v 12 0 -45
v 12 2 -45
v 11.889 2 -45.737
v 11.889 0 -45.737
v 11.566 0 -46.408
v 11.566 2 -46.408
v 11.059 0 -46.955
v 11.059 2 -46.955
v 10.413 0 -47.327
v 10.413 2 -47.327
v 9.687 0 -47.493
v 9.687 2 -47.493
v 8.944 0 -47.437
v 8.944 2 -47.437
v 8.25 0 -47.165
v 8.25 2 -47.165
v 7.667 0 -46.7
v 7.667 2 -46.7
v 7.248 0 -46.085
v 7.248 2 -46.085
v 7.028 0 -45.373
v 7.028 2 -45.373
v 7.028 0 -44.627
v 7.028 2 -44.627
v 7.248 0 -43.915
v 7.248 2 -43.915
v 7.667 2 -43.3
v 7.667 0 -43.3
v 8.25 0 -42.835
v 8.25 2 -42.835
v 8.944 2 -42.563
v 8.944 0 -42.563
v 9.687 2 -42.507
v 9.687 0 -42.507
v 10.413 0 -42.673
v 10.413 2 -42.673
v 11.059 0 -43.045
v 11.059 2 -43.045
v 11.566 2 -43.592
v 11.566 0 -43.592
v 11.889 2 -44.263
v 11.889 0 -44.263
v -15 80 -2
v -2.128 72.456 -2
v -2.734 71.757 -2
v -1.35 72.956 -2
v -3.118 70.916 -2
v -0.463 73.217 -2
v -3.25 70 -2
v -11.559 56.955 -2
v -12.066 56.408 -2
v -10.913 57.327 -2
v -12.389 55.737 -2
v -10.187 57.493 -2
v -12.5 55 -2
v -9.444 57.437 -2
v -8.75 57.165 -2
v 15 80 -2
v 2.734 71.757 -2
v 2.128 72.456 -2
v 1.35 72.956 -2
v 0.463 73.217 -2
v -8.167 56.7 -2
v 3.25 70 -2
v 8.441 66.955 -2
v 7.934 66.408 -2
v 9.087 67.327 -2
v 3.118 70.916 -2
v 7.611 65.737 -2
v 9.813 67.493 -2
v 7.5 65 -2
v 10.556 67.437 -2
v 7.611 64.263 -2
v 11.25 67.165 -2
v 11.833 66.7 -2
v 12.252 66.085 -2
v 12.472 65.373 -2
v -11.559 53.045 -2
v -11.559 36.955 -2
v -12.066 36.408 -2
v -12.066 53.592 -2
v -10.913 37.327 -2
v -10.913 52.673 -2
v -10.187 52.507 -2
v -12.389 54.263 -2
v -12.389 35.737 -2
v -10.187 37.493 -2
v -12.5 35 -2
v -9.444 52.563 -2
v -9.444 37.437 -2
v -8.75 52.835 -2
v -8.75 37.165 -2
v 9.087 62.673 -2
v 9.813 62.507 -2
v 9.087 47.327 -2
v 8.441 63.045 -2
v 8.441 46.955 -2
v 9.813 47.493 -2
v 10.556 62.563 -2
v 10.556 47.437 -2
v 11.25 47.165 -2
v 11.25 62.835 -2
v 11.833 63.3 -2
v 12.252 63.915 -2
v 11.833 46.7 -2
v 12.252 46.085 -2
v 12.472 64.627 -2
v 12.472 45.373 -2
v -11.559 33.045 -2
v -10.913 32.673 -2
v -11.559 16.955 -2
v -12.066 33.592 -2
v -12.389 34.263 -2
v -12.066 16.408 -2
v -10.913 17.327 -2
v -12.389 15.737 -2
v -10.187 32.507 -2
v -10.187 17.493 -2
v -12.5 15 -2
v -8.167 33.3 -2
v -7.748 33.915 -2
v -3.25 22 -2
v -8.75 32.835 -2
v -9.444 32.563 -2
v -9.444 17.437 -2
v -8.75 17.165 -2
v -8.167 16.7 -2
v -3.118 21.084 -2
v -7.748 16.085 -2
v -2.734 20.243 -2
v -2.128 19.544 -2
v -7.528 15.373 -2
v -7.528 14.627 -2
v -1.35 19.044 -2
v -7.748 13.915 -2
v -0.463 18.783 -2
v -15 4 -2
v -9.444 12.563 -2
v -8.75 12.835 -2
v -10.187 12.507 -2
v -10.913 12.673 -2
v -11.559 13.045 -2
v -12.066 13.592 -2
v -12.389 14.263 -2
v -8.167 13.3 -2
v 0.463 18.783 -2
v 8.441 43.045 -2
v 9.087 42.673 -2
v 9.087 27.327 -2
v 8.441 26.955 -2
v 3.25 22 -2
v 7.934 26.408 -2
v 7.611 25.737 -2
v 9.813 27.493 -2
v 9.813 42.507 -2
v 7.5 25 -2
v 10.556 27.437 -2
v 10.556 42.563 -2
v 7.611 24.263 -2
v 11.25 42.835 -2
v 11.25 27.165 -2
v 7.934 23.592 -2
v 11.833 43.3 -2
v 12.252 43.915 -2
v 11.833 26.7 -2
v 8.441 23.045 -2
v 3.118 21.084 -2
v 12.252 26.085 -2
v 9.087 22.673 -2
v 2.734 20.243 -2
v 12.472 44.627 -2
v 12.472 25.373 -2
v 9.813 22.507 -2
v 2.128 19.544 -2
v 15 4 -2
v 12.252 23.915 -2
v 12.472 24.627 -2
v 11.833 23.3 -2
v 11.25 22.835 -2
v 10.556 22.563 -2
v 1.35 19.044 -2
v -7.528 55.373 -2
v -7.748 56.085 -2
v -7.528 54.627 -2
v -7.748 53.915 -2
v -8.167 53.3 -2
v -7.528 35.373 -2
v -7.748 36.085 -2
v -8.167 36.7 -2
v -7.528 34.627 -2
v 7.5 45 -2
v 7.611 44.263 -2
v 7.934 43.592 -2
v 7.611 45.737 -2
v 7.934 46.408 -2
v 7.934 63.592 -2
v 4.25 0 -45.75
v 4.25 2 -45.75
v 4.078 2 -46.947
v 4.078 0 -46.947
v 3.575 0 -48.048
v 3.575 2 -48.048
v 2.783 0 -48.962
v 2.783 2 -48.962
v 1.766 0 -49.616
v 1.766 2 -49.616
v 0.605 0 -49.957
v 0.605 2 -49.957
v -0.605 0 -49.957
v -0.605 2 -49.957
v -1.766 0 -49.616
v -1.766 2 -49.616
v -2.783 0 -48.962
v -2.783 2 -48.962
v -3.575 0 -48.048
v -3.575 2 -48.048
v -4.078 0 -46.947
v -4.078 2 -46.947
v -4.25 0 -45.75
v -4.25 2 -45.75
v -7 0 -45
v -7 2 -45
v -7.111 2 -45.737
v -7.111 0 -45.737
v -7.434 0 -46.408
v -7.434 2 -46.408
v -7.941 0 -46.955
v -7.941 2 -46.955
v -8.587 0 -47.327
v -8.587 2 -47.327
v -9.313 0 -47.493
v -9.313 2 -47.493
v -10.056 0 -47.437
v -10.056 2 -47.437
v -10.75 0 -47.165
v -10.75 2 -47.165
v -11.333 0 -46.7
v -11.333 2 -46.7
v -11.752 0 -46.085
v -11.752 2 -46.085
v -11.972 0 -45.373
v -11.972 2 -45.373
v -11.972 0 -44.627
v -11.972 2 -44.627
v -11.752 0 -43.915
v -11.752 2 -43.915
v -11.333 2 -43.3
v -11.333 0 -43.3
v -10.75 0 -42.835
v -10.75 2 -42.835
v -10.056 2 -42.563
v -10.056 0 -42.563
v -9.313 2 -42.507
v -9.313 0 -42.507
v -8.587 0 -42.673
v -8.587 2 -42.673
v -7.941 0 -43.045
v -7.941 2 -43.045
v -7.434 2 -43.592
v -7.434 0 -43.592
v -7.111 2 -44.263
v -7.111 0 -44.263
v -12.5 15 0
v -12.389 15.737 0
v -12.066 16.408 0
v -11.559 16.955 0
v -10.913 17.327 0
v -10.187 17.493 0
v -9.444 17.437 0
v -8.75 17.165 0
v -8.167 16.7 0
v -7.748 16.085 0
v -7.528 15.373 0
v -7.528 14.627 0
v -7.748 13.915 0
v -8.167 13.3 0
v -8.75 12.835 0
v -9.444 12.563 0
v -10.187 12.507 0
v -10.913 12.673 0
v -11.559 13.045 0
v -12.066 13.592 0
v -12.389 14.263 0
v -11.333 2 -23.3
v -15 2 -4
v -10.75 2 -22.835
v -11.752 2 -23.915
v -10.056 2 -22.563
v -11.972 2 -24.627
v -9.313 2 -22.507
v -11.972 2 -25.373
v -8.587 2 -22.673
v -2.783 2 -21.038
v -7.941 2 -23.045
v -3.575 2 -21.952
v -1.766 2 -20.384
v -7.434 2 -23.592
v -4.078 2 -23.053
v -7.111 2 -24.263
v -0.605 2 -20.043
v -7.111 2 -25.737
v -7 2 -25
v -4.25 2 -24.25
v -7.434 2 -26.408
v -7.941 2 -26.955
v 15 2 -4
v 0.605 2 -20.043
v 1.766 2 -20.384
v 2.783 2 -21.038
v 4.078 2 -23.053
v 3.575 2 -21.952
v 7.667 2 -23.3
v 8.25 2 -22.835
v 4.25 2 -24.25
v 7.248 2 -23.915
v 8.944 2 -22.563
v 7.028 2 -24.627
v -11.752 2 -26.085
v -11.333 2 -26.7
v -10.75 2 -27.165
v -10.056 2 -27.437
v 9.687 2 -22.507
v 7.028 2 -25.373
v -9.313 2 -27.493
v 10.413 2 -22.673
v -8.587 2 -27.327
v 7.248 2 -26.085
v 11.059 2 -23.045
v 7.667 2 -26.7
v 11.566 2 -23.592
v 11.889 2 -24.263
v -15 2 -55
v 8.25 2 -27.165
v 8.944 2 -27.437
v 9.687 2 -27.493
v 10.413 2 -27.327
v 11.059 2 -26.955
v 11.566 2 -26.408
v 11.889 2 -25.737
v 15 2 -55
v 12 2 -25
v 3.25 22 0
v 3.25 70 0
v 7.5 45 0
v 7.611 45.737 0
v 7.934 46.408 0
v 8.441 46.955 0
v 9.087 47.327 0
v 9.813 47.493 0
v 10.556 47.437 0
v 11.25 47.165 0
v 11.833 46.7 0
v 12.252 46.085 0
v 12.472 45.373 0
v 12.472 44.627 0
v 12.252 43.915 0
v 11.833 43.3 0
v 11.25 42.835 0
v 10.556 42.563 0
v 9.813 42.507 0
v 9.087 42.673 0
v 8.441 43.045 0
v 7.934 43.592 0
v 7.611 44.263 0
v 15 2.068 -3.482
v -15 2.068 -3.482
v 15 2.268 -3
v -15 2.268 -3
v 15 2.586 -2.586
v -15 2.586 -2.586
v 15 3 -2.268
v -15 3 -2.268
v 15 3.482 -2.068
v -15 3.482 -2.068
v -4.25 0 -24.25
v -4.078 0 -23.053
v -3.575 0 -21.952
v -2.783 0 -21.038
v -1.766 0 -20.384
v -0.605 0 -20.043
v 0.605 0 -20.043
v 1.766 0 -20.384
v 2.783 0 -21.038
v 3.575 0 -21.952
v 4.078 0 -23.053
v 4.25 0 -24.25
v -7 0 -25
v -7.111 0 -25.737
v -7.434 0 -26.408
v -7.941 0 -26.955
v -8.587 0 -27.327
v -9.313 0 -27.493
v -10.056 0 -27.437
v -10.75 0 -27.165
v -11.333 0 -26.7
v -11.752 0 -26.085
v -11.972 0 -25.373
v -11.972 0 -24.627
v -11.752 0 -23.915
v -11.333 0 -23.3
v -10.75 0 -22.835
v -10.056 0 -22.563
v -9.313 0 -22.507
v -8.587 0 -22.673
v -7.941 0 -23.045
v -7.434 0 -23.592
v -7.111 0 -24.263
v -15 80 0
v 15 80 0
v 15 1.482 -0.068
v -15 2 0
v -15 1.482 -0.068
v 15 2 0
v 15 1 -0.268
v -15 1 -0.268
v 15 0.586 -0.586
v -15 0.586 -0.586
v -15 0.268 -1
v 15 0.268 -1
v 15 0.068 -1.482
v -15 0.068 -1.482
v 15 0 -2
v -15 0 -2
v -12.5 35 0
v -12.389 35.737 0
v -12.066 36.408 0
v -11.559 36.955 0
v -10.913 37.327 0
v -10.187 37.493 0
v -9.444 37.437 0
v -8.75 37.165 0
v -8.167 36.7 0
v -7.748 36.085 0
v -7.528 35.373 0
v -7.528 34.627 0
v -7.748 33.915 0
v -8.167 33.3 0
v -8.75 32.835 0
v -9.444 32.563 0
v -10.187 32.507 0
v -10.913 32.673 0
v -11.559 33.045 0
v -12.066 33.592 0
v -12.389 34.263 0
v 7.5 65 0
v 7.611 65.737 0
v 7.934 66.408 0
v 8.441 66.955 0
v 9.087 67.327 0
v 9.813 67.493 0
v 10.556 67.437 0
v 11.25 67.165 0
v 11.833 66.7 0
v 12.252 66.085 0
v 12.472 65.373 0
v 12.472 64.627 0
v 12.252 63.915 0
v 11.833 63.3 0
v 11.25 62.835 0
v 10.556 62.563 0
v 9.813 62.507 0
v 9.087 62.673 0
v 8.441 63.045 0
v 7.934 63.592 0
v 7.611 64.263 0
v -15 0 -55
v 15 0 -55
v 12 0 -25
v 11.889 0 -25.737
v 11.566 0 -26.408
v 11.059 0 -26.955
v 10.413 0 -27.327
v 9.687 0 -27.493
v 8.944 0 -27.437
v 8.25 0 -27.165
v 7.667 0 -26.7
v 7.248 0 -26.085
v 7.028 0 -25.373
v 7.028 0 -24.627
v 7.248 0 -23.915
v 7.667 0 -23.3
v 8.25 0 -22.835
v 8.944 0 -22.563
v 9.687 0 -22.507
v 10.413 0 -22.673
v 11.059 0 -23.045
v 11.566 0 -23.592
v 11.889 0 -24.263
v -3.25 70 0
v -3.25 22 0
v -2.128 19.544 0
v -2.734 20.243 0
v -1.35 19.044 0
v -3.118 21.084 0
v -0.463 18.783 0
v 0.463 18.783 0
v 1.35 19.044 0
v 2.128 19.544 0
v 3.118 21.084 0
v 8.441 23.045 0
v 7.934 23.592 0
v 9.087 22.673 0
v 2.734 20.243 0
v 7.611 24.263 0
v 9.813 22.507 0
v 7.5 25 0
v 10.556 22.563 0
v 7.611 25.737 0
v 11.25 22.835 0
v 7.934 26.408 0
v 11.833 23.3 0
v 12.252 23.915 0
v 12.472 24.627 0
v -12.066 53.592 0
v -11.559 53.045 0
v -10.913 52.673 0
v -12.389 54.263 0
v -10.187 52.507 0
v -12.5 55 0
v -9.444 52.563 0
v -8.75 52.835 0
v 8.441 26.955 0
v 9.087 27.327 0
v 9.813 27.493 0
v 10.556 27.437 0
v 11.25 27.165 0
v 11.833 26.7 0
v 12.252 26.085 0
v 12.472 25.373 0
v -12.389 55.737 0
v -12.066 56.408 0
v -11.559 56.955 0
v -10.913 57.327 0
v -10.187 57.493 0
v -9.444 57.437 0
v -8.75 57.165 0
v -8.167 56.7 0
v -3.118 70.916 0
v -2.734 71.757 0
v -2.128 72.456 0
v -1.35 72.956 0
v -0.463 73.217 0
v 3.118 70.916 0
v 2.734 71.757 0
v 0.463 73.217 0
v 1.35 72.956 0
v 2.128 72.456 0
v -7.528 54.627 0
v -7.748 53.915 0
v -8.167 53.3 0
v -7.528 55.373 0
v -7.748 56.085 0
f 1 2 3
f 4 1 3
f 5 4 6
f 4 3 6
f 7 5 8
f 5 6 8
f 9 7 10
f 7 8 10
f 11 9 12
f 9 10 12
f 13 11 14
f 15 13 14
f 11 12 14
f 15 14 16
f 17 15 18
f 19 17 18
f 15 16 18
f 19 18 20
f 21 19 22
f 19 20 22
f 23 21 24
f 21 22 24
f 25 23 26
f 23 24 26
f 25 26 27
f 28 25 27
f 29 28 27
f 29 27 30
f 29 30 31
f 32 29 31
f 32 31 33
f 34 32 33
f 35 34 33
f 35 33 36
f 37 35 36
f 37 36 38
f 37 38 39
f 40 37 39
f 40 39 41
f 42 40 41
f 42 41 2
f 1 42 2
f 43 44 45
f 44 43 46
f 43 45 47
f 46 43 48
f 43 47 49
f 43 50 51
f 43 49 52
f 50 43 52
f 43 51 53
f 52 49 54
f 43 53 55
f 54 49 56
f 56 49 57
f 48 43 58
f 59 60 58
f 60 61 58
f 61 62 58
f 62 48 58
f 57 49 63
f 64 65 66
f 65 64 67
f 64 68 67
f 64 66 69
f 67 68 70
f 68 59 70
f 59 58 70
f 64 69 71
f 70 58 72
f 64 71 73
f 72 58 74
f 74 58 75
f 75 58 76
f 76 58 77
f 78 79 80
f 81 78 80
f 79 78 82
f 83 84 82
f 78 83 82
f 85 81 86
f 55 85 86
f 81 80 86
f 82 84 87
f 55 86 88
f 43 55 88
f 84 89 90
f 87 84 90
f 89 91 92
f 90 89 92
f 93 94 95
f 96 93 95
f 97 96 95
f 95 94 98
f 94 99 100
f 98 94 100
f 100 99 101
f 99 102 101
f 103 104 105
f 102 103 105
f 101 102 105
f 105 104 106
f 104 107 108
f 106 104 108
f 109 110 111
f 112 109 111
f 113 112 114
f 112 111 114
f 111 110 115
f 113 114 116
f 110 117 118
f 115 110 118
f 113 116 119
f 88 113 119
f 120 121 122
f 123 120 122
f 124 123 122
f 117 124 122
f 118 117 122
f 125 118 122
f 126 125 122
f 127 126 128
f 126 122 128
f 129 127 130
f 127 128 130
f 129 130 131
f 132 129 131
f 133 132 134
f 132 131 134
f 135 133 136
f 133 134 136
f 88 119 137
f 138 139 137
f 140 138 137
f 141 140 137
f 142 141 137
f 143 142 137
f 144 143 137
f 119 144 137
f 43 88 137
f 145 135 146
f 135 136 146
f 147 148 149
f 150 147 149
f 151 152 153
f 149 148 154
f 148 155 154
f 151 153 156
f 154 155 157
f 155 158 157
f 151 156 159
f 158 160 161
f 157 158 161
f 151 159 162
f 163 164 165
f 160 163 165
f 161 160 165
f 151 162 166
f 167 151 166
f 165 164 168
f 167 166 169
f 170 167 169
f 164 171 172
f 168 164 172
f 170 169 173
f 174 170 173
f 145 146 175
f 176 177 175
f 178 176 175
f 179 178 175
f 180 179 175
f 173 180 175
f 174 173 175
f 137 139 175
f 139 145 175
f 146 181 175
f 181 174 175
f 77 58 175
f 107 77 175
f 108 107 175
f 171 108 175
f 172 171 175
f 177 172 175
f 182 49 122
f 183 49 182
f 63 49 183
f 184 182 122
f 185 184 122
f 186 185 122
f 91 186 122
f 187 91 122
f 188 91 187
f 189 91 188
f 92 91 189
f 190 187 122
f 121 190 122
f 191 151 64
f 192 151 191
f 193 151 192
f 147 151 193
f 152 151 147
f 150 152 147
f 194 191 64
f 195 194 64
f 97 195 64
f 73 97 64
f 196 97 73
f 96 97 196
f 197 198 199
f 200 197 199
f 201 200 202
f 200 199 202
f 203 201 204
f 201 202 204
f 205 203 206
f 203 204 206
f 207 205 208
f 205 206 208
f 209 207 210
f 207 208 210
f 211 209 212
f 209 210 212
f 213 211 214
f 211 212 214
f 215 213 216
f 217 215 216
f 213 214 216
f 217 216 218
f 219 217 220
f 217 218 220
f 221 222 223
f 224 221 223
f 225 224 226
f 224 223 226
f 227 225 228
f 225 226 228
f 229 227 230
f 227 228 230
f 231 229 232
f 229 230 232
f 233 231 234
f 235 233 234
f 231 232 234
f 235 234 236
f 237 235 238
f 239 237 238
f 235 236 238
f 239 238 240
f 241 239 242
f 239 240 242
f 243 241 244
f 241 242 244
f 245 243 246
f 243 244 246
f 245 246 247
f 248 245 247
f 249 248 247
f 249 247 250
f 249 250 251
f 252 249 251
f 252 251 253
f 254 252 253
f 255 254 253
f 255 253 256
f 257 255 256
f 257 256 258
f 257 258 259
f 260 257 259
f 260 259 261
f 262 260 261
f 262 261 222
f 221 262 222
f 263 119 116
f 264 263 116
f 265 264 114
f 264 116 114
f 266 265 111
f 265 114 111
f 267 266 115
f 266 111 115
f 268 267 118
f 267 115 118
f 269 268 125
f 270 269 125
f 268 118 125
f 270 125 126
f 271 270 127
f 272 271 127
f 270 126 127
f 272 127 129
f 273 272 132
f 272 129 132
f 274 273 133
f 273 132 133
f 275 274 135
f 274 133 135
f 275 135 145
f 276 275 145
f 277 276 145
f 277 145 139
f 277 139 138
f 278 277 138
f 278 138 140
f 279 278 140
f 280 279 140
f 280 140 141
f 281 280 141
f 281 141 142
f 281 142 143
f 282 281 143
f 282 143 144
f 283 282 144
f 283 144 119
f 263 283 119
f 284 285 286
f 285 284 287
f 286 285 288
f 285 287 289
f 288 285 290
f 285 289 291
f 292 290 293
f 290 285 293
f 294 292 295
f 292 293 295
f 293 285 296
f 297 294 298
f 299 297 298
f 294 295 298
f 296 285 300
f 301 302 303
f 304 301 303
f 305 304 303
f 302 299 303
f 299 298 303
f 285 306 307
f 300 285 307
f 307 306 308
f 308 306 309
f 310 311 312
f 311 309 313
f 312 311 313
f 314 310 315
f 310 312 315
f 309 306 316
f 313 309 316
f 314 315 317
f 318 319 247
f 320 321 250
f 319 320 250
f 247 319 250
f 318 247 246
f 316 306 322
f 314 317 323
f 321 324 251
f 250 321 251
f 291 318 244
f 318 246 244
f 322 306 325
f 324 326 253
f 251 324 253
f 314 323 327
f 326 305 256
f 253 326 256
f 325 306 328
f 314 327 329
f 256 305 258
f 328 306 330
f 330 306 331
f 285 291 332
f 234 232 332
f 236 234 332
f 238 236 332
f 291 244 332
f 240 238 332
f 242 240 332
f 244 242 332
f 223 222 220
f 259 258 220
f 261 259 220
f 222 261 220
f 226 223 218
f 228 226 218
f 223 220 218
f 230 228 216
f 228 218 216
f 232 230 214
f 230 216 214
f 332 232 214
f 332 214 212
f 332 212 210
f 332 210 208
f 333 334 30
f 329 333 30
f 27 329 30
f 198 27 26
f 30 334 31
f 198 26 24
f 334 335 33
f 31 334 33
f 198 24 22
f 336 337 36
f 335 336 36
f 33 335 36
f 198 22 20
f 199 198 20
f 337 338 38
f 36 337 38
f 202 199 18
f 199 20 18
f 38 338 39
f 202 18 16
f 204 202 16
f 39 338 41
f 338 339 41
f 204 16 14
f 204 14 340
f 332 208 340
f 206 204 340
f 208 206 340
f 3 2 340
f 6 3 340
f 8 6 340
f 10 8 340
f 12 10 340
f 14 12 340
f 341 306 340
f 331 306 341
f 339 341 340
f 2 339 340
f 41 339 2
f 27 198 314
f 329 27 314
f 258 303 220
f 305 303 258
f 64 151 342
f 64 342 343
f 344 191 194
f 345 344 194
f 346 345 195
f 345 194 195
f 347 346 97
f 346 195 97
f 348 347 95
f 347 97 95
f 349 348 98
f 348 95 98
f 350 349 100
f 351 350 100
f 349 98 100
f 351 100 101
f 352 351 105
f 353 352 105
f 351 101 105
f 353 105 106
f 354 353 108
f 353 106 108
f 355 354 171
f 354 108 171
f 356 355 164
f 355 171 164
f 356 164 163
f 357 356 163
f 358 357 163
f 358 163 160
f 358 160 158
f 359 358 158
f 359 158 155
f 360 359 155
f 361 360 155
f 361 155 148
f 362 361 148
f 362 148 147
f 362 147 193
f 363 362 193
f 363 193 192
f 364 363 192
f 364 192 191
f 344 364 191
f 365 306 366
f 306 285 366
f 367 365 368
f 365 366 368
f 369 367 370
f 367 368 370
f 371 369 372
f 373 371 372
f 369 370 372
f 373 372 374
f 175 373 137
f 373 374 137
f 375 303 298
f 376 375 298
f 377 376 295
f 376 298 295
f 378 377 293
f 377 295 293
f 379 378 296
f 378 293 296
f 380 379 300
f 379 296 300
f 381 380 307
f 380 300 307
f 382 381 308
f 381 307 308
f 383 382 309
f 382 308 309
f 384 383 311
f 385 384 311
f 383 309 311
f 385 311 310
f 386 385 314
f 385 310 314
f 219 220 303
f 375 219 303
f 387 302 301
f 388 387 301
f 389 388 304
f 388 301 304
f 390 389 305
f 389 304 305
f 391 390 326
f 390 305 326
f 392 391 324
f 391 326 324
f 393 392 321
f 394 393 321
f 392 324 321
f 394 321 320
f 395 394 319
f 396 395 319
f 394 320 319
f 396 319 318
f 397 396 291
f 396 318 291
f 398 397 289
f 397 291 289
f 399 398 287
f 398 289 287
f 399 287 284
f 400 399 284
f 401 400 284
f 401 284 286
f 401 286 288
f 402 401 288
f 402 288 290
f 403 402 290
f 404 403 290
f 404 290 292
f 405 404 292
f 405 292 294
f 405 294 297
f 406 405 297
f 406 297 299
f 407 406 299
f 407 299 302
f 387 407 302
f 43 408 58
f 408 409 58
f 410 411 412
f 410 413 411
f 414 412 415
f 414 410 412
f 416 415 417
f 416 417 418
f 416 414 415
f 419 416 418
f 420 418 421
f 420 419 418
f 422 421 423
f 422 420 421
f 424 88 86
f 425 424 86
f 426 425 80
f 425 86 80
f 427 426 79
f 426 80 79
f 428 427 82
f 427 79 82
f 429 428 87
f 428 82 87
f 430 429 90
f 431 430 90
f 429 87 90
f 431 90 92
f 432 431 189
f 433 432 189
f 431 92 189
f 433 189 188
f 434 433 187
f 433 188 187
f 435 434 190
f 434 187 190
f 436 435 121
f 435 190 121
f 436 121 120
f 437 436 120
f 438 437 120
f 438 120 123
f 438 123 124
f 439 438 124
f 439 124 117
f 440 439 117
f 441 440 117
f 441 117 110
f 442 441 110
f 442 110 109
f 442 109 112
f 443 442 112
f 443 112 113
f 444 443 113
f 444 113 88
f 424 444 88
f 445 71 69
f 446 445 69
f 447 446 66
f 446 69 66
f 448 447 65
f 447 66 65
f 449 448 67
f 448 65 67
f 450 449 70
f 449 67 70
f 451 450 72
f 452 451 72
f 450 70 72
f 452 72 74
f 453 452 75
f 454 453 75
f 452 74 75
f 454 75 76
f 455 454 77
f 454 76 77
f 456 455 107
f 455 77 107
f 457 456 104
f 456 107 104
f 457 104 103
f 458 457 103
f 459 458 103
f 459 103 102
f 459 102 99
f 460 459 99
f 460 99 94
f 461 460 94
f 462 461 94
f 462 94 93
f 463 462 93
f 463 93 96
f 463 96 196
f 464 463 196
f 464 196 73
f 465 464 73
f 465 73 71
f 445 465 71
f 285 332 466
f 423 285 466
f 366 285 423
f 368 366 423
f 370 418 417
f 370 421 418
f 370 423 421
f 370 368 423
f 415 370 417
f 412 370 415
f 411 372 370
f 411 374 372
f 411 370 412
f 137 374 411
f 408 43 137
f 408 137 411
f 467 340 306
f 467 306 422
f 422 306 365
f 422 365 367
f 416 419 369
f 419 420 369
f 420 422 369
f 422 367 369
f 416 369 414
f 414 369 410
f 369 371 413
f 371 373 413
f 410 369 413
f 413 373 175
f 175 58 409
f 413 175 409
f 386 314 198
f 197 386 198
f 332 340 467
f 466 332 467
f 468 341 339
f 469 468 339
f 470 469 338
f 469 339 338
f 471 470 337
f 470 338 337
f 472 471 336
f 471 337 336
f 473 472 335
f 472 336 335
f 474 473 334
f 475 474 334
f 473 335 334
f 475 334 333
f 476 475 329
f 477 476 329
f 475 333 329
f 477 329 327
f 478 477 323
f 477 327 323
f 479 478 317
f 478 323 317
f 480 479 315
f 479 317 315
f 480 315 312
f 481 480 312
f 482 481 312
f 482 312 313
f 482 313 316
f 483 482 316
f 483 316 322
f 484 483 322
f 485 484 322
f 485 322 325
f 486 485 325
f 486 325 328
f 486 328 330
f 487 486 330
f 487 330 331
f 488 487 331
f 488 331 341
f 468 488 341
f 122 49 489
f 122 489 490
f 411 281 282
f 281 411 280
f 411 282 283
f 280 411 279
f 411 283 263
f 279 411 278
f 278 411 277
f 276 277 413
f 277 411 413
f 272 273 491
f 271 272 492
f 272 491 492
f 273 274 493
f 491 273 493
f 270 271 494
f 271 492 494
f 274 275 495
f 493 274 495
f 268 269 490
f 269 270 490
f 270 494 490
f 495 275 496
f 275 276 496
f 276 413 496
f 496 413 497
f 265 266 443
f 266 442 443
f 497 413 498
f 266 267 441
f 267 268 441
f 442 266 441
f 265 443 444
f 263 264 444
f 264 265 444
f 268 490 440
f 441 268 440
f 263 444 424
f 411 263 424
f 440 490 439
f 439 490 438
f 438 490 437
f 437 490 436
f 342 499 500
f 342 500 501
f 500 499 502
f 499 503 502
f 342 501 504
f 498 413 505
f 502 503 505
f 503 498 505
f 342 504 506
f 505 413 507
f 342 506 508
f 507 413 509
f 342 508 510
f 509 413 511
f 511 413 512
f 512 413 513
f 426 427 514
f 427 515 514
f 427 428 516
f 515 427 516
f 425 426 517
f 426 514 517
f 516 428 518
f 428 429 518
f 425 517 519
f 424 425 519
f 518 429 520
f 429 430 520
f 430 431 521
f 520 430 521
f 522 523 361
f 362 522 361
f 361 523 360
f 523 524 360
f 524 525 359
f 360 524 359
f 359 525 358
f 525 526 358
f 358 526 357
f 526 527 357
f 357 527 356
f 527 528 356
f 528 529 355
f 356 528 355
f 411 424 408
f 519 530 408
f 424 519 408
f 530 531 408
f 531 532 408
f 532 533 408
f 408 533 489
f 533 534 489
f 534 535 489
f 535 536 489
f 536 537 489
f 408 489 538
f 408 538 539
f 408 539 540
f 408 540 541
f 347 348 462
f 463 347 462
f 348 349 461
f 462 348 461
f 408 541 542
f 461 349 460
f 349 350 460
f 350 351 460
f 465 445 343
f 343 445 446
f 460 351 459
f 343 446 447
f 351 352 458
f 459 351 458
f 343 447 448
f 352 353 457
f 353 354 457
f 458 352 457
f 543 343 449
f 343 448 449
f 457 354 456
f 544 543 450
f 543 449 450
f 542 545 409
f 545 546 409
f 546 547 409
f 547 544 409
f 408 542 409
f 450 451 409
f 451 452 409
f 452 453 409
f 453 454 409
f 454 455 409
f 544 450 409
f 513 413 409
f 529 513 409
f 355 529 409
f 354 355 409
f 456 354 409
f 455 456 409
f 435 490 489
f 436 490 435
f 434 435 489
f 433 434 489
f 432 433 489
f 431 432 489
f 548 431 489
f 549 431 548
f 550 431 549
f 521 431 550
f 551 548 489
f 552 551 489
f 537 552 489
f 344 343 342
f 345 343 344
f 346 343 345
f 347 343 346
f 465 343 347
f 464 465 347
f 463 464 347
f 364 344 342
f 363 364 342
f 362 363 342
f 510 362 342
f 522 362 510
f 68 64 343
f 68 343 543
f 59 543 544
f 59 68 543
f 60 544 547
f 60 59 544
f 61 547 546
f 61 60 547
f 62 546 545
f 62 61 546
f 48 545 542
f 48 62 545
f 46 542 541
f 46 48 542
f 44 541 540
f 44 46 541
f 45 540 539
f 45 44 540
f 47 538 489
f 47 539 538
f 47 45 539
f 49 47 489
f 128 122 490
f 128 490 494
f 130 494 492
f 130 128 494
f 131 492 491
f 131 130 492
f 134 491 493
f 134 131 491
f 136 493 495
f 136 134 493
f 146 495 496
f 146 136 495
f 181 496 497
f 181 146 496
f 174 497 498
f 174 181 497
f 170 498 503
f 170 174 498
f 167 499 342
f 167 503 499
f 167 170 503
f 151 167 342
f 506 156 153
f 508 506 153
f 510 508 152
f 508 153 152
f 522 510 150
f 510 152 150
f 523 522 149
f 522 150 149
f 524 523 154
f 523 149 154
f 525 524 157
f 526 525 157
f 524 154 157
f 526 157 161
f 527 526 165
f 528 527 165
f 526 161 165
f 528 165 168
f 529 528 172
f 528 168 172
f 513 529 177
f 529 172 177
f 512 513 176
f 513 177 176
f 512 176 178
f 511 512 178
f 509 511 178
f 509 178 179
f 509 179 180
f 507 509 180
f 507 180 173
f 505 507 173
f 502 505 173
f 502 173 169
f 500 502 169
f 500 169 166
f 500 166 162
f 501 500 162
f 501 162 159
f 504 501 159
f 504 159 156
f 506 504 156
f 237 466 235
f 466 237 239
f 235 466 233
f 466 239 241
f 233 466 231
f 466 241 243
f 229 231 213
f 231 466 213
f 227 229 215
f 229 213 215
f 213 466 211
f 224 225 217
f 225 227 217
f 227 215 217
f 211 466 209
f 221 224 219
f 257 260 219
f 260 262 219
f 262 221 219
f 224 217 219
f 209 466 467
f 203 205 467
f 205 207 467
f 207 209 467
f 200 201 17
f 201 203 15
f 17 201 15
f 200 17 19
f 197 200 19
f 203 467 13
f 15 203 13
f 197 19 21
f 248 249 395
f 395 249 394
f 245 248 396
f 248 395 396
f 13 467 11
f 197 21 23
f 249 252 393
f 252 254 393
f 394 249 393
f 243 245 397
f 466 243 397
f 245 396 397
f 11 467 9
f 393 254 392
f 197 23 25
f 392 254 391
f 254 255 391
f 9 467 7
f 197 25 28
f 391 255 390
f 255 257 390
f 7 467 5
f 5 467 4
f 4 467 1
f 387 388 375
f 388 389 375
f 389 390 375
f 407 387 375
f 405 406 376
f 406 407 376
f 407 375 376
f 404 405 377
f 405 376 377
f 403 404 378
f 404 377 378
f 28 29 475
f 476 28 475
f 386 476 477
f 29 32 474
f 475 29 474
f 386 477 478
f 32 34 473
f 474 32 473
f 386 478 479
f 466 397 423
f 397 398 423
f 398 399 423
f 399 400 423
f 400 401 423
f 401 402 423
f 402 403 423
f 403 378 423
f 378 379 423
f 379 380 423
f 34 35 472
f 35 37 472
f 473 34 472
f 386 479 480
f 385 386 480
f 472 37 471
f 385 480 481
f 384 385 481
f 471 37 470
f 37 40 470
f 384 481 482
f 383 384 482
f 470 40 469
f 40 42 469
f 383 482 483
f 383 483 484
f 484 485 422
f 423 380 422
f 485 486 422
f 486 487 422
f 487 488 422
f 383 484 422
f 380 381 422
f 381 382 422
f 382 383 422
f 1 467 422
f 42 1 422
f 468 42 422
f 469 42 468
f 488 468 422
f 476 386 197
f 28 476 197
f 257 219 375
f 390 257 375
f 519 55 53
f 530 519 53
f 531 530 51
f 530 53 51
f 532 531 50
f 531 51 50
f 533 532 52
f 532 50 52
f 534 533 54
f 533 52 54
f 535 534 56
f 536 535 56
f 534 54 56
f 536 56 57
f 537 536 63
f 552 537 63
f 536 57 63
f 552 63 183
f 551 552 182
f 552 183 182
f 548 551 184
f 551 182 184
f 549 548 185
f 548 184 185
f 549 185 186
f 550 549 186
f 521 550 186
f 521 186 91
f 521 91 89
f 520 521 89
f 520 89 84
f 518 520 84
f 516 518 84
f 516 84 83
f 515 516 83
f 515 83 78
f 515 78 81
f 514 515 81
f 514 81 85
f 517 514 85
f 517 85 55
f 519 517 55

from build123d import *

# Parameters (mm, degrees)
BOSS_EXTRU_1_DEPTH      = 15
CONG_1_R                = 2
ENL_V_MAT_EXTRU_1_REACH = 4
ESQUISSE2_R             = 2.5
ENL_V_MAT_EXTRU_2_REACH = 4
ESQUISSE4_R             = 2.5


with BuildPart() as part:
    # Esquisse1 → Boss.-Extru.1 (new body, symmetric)
    with BuildSketch(Plane(origin=(0, 0, 0), x_dir=(0, 0, -1), z_dir=(1, 0, 0))):
        Polygon((0, 0), (0, 80), (2, 80), (2, 2), (55, 2), (55, 0), align=None)
    extrude(amount=BOSS_EXTRU_1_DEPTH, both=True)

    # Congé1
    cong_1_edges = [part.edges().sort_by_distance(p)[0] for p in [
        (0, 0, 0),
        (0, 2, -2),
    ]]
    fillet(cong_1_edges, radius=CONG_1_R)

    # Esquisse2 → Enlèv. mat.-Extru.1 (cut, up to next)
    with BuildSketch(Plane(origin=(0, 2, 0), x_dir=(1, 0, 0), z_dir=(0, 1, 0)), mode=Mode.PRIVATE) as enl_v_mat_extru_1_sk1:
        with BuildLine():
            Line((4.25, 24.25), (4.25, 45.75))
            ThreePointArc((4.25, 45.75), (0, 50), (-4.25, 45.75))
            Line((-4.25, 45.75), (-4.25, 24.25))
            ThreePointArc((-4.25, 24.25), (0, 20), (4.25, 24.25))
        make_face()
    enl_v_mat_extru_1_tool1 = extrude(enl_v_mat_extru_1_sk1.sketch, amount=-ENL_V_MAT_EXTRU_1_REACH, mode=Mode.PRIVATE) & part.part
    add(enl_v_mat_extru_1_tool1.solids().sort_by_distance((0, 2, -35))[0], mode=Mode.SUBTRACT)
    # Esquisse2 → Enlèv. mat.-Extru.1 (cut, up to next)
    with BuildSketch(Plane(origin=(0, 2, 0), x_dir=(1, 0, 0), z_dir=(0, 1, 0)), mode=Mode.PRIVATE) as enl_v_mat_extru_1_sk2:
        with Locations((-9.5, 25)):
            Circle(ESQUISSE2_R)
    enl_v_mat_extru_1_tool2 = extrude(enl_v_mat_extru_1_sk2.sketch, amount=-ENL_V_MAT_EXTRU_1_REACH, mode=Mode.PRIVATE) & part.part
    add(enl_v_mat_extru_1_tool2.solids().sort_by_distance((-9.5, 2, -25))[0], mode=Mode.SUBTRACT)
    # Esquisse2 → Enlèv. mat.-Extru.1 (cut, up to next)
    with BuildSketch(Plane(origin=(0, 2, 0), x_dir=(1, 0, 0), z_dir=(0, 1, 0)), mode=Mode.PRIVATE) as enl_v_mat_extru_1_sk3:
        with Locations((-9.5, 45)):
            Circle(ESQUISSE2_R)
    enl_v_mat_extru_1_tool3 = extrude(enl_v_mat_extru_1_sk3.sketch, amount=-ENL_V_MAT_EXTRU_1_REACH, mode=Mode.PRIVATE) & part.part
    add(enl_v_mat_extru_1_tool3.solids().sort_by_distance((-9.5, 2, -45))[0], mode=Mode.SUBTRACT)
    # Esquisse2 → Enlèv. mat.-Extru.1 (cut, up to next)
    with BuildSketch(Plane(origin=(0, 2, 0), x_dir=(1, 0, 0), z_dir=(0, 1, 0)), mode=Mode.PRIVATE) as enl_v_mat_extru_1_sk4:
        with Locations((9.5, 45)):
            Circle(ESQUISSE2_R)
    enl_v_mat_extru_1_tool4 = extrude(enl_v_mat_extru_1_sk4.sketch, amount=-ENL_V_MAT_EXTRU_1_REACH, mode=Mode.PRIVATE) & part.part
    add(enl_v_mat_extru_1_tool4.solids().sort_by_distance((9.5, 2, -45))[0], mode=Mode.SUBTRACT)
    # Esquisse2 → Enlèv. mat.-Extru.1 (cut, up to next)
    with BuildSketch(Plane(origin=(0, 2, 0), x_dir=(1, 0, 0), z_dir=(0, 1, 0)), mode=Mode.PRIVATE) as enl_v_mat_extru_1_sk5:
        with Locations((9.5, 25)):
            Circle(ESQUISSE2_R)
    enl_v_mat_extru_1_tool5 = extrude(enl_v_mat_extru_1_sk5.sketch, amount=-ENL_V_MAT_EXTRU_1_REACH, mode=Mode.PRIVATE) & part.part
    add(enl_v_mat_extru_1_tool5.solids().sort_by_distance((9.5, 2, -25))[0], mode=Mode.SUBTRACT)

    # Esquisse4 → Enlèv. mat.-Extru.2 (cut, up to next)
    with BuildSketch(Plane(origin=(0, 0, -2), x_dir=(-1, 0, 0), z_dir=(0, 0, -1)), mode=Mode.PRIVATE) as enl_v_mat_extru_2_sk1:
        with Locations((-10, 65)):
            Circle(ESQUISSE4_R)
    enl_v_mat_extru_2_tool1 = extrude(enl_v_mat_extru_2_sk1.sketch, amount=-ENL_V_MAT_EXTRU_2_REACH, mode=Mode.PRIVATE) & part.part
    add(enl_v_mat_extru_2_tool1.solids().sort_by_distance((10, 65, -2))[0], mode=Mode.SUBTRACT)
    # Esquisse4 → Enlèv. mat.-Extru.2 (cut, up to next)
    with BuildSketch(Plane(origin=(0, 0, -2), x_dir=(-1, 0, 0), z_dir=(0, 0, -1)), mode=Mode.PRIVATE) as enl_v_mat_extru_2_sk2:
        with Locations((-10, 45)):
            Circle(ESQUISSE4_R)
    enl_v_mat_extru_2_tool2 = extrude(enl_v_mat_extru_2_sk2.sketch, amount=-ENL_V_MAT_EXTRU_2_REACH, mode=Mode.PRIVATE) & part.part
    add(enl_v_mat_extru_2_tool2.solids().sort_by_distance((10, 45, -2))[0], mode=Mode.SUBTRACT)
    # Esquisse4 → Enlèv. mat.-Extru.2 (cut, up to next)
    with BuildSketch(Plane(origin=(0, 0, -2), x_dir=(-1, 0, 0), z_dir=(0, 0, -1)), mode=Mode.PRIVATE) as enl_v_mat_extru_2_sk3:
        with Locations((-10, 25)):
            Circle(ESQUISSE4_R)
    enl_v_mat_extru_2_tool3 = extrude(enl_v_mat_extru_2_sk3.sketch, amount=-ENL_V_MAT_EXTRU_2_REACH, mode=Mode.PRIVATE) & part.part
    add(enl_v_mat_extru_2_tool3.solids().sort_by_distance((10, 25, -2))[0], mode=Mode.SUBTRACT)
    # Esquisse4 → Enlèv. mat.-Extru.2 (cut, up to next)
    with BuildSketch(Plane(origin=(0, 0, -2), x_dir=(-1, 0, 0), z_dir=(0, 0, -1)), mode=Mode.PRIVATE) as enl_v_mat_extru_2_sk4:
        with Locations((10, 55)):
            Circle(ESQUISSE4_R)
    enl_v_mat_extru_2_tool4 = extrude(enl_v_mat_extru_2_sk4.sketch, amount=-ENL_V_MAT_EXTRU_2_REACH, mode=Mode.PRIVATE) & part.part
    add(enl_v_mat_extru_2_tool4.solids().sort_by_distance((-10, 55, -2))[0], mode=Mode.SUBTRACT)
    # Esquisse4 → Enlèv. mat.-Extru.2 (cut, up to next)
    with BuildSketch(Plane(origin=(0, 0, -2), x_dir=(-1, 0, 0), z_dir=(0, 0, -1)), mode=Mode.PRIVATE) as enl_v_mat_extru_2_sk5:
        with Locations((10, 35)):
            Circle(ESQUISSE4_R)
    enl_v_mat_extru_2_tool5 = extrude(enl_v_mat_extru_2_sk5.sketch, amount=-ENL_V_MAT_EXTRU_2_REACH, mode=Mode.PRIVATE) & part.part
    add(enl_v_mat_extru_2_tool5.solids().sort_by_distance((-10, 35, -2))[0], mode=Mode.SUBTRACT)
    # Esquisse4 → Enlèv. mat.-Extru.2 (cut, up to next)
    with BuildSketch(Plane(origin=(0, 0, -2), x_dir=(-1, 0, 0), z_dir=(0, 0, -1)), mode=Mode.PRIVATE) as enl_v_mat_extru_2_sk6:
        with Locations((10, 15)):
            Circle(ESQUISSE4_R)
    enl_v_mat_extru_2_tool6 = extrude(enl_v_mat_extru_2_sk6.sketch, amount=-ENL_V_MAT_EXTRU_2_REACH, mode=Mode.PRIVATE) & part.part
    add(enl_v_mat_extru_2_tool6.solids().sort_by_distance((-10, 15, -2))[0], mode=Mode.SUBTRACT)
    # Esquisse4 → Enlèv. mat.-Extru.2 (cut, up to next)
    with BuildSketch(Plane(origin=(0, 0, -2), x_dir=(-1, 0, 0), z_dir=(0, 0, -1)), mode=Mode.PRIVATE) as enl_v_mat_extru_2_sk7:
        with BuildLine():
            Line((3.25, 70), (3.25, 22))
            ThreePointArc((3.25, 22), (0, 18.75), (-3.25, 22))
            Line((-3.25, 22), (-3.25, 70))
            ThreePointArc((-3.25, 70), (0, 73.25), (3.25, 70))
        make_face()
    enl_v_mat_extru_2_tool7 = extrude(enl_v_mat_extru_2_sk7.sketch, amount=-ENL_V_MAT_EXTRU_2_REACH, mode=Mode.PRIVATE) & part.part
    add(enl_v_mat_extru_2_tool7.solids().sort_by_distance((0, 46, -2))[0], mode=Mode.SUBTRACT)


solid = part.part
